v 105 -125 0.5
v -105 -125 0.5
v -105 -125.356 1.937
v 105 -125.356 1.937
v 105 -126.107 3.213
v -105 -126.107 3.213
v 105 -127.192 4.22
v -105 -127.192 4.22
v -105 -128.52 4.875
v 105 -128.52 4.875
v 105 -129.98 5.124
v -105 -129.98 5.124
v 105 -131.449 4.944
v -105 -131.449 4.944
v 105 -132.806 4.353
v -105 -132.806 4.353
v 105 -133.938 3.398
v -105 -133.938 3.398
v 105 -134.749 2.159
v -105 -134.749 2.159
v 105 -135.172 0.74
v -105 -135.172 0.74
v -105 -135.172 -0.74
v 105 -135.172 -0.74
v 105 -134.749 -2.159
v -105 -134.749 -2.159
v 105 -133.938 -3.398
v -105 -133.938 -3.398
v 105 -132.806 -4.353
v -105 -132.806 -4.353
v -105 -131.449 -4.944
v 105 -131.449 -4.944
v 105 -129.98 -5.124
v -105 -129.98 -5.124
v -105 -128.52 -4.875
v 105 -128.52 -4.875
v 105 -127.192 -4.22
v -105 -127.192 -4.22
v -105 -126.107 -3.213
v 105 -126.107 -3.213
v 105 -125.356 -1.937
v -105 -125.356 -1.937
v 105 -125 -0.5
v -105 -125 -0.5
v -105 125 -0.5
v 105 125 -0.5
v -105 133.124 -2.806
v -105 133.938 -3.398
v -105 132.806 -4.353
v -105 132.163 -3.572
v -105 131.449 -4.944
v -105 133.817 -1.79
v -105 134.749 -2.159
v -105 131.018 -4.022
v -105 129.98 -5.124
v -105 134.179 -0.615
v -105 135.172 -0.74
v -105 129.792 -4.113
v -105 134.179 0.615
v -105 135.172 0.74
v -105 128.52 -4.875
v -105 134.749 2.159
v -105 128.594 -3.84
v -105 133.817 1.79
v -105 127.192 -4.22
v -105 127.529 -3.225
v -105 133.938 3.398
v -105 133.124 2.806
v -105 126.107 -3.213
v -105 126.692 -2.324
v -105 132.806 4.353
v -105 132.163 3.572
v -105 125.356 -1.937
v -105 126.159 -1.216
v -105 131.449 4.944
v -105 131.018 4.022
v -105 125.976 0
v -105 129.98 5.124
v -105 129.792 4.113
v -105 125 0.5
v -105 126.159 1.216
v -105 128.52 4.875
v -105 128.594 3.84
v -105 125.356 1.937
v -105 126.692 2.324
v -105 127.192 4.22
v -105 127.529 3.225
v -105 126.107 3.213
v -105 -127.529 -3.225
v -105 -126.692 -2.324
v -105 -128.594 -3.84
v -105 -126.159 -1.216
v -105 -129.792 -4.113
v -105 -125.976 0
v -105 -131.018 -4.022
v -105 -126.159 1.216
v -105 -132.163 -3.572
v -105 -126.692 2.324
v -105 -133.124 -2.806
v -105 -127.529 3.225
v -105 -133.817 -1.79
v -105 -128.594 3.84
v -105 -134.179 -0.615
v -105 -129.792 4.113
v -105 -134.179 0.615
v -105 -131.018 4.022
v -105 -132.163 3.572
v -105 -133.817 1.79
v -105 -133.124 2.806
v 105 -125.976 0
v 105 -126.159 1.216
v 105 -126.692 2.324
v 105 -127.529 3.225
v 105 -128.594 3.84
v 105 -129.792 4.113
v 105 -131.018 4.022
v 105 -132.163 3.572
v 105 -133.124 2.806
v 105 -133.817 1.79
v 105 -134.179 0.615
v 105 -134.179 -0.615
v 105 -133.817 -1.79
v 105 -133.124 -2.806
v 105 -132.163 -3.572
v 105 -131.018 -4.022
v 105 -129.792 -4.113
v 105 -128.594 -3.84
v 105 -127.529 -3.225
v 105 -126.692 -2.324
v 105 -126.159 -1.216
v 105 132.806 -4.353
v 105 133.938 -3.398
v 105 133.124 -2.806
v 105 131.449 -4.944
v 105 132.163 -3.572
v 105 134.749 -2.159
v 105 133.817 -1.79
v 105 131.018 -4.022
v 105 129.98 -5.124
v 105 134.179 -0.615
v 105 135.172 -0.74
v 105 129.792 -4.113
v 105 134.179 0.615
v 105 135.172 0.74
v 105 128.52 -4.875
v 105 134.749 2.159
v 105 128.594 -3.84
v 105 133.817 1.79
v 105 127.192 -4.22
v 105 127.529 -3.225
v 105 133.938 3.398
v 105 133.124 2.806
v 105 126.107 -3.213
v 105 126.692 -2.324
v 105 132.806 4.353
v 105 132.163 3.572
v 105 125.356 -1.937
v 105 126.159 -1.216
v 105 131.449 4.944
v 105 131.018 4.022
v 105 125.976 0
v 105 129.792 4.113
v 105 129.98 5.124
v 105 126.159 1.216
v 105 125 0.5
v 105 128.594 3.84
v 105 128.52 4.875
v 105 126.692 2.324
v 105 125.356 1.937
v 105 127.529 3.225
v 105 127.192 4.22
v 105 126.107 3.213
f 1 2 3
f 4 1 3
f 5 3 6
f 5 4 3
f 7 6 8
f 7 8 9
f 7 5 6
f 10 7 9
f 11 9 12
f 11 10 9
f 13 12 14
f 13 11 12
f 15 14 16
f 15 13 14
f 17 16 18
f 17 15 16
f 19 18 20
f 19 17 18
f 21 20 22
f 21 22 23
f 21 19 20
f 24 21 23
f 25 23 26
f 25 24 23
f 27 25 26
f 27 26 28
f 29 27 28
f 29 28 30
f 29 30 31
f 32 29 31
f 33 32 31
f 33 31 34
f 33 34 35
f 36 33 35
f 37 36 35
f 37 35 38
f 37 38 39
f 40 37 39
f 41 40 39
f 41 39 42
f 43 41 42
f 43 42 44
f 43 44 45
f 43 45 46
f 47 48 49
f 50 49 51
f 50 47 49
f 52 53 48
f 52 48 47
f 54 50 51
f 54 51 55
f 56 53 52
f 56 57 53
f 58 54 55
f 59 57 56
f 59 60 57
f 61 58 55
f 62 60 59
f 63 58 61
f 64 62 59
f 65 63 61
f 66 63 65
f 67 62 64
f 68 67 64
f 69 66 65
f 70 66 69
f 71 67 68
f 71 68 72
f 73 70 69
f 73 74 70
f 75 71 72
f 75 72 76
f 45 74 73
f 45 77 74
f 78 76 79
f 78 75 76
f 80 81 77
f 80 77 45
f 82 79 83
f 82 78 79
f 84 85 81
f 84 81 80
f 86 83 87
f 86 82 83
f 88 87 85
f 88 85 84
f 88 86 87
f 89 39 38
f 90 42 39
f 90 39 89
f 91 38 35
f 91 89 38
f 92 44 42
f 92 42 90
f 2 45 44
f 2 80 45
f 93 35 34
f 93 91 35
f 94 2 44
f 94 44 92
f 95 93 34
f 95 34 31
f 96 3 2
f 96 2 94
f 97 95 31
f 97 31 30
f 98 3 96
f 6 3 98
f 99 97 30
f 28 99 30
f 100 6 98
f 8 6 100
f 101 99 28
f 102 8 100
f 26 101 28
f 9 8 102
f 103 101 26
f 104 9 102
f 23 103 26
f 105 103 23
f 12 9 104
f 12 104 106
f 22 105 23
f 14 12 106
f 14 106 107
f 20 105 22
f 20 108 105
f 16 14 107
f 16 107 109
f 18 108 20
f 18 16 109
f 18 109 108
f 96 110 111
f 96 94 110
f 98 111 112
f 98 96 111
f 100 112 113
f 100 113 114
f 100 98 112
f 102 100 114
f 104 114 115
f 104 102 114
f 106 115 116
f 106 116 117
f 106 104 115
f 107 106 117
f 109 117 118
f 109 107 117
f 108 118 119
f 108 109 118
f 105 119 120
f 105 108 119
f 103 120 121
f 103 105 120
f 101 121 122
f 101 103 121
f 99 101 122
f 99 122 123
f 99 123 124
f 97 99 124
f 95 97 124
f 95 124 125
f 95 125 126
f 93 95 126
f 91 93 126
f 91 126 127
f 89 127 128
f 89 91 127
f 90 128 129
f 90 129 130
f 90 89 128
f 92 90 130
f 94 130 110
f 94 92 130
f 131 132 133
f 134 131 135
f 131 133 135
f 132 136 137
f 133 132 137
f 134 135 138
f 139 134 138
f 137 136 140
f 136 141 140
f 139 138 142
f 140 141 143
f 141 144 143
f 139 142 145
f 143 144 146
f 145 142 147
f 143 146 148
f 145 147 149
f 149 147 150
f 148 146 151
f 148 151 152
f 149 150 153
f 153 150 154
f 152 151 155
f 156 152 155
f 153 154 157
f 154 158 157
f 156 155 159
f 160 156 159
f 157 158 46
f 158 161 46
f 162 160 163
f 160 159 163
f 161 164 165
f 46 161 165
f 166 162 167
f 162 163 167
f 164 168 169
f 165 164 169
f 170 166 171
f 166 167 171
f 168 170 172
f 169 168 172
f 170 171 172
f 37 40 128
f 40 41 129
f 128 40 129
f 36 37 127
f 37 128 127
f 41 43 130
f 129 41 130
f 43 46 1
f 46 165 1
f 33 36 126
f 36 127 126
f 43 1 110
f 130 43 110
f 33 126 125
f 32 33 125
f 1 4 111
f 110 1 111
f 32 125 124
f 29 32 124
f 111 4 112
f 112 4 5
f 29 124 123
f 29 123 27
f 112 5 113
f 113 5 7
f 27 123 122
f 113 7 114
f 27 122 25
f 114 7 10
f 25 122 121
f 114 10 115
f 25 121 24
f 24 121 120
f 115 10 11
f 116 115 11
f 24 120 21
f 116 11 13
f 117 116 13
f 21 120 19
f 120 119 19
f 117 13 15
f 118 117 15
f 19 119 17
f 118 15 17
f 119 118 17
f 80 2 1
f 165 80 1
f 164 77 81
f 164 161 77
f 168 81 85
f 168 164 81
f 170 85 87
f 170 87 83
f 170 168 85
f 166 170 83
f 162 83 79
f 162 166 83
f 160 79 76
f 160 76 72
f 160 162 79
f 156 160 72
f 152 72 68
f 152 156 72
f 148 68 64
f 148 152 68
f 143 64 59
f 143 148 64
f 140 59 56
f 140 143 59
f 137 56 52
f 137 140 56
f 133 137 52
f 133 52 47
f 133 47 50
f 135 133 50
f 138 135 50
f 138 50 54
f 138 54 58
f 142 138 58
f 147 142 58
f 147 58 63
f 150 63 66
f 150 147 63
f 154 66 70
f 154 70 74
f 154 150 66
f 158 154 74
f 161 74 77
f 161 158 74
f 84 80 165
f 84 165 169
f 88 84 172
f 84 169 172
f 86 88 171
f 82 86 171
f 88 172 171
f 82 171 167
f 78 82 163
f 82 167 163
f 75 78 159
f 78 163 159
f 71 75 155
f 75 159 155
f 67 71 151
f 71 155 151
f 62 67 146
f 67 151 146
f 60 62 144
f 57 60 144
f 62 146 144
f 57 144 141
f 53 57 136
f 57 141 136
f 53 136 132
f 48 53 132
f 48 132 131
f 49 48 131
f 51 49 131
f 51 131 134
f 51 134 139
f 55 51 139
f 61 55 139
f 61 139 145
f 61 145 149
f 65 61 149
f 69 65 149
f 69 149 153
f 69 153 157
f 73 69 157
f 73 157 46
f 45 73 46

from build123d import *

# Parameters (mm, degrees)
F0_W          = 210
F0_H          = 250
F1_DEPTH      = 0.5
F2_R          = 5.125
F2_R_2        = 4.125
F3_DEPTH      = 105
F3_DEPTH_BACK = 105


with BuildPart() as f1:
    # F0 (on Top) → F1 (new body, symmetric)
    with BuildSketch(Plane.XY):
        Rectangle(F0_W, F0_H)
    extrude(amount=F1_DEPTH, both=True)

    # F2 (on Right) → F3 (join, two sides)
    with BuildSketch(Plane.YZ) as f3_sk:
        with Locations((-130.100551, 0)):
            Circle(F2_R)
        with Locations((-130.100551, 0)):
            Circle(F2_R_2, mode=Mode.SUBTRACT)
    extrude(amount=F3_DEPTH)
    extrude(f3_sk.sketch, amount=-F3_DEPTH_BACK)

    # F4: F1 across plane


with BuildPart() as f1_1:
    add(f1.part)
    add(f1.part.mirror(Plane.XZ))


solid = f1_1.part
